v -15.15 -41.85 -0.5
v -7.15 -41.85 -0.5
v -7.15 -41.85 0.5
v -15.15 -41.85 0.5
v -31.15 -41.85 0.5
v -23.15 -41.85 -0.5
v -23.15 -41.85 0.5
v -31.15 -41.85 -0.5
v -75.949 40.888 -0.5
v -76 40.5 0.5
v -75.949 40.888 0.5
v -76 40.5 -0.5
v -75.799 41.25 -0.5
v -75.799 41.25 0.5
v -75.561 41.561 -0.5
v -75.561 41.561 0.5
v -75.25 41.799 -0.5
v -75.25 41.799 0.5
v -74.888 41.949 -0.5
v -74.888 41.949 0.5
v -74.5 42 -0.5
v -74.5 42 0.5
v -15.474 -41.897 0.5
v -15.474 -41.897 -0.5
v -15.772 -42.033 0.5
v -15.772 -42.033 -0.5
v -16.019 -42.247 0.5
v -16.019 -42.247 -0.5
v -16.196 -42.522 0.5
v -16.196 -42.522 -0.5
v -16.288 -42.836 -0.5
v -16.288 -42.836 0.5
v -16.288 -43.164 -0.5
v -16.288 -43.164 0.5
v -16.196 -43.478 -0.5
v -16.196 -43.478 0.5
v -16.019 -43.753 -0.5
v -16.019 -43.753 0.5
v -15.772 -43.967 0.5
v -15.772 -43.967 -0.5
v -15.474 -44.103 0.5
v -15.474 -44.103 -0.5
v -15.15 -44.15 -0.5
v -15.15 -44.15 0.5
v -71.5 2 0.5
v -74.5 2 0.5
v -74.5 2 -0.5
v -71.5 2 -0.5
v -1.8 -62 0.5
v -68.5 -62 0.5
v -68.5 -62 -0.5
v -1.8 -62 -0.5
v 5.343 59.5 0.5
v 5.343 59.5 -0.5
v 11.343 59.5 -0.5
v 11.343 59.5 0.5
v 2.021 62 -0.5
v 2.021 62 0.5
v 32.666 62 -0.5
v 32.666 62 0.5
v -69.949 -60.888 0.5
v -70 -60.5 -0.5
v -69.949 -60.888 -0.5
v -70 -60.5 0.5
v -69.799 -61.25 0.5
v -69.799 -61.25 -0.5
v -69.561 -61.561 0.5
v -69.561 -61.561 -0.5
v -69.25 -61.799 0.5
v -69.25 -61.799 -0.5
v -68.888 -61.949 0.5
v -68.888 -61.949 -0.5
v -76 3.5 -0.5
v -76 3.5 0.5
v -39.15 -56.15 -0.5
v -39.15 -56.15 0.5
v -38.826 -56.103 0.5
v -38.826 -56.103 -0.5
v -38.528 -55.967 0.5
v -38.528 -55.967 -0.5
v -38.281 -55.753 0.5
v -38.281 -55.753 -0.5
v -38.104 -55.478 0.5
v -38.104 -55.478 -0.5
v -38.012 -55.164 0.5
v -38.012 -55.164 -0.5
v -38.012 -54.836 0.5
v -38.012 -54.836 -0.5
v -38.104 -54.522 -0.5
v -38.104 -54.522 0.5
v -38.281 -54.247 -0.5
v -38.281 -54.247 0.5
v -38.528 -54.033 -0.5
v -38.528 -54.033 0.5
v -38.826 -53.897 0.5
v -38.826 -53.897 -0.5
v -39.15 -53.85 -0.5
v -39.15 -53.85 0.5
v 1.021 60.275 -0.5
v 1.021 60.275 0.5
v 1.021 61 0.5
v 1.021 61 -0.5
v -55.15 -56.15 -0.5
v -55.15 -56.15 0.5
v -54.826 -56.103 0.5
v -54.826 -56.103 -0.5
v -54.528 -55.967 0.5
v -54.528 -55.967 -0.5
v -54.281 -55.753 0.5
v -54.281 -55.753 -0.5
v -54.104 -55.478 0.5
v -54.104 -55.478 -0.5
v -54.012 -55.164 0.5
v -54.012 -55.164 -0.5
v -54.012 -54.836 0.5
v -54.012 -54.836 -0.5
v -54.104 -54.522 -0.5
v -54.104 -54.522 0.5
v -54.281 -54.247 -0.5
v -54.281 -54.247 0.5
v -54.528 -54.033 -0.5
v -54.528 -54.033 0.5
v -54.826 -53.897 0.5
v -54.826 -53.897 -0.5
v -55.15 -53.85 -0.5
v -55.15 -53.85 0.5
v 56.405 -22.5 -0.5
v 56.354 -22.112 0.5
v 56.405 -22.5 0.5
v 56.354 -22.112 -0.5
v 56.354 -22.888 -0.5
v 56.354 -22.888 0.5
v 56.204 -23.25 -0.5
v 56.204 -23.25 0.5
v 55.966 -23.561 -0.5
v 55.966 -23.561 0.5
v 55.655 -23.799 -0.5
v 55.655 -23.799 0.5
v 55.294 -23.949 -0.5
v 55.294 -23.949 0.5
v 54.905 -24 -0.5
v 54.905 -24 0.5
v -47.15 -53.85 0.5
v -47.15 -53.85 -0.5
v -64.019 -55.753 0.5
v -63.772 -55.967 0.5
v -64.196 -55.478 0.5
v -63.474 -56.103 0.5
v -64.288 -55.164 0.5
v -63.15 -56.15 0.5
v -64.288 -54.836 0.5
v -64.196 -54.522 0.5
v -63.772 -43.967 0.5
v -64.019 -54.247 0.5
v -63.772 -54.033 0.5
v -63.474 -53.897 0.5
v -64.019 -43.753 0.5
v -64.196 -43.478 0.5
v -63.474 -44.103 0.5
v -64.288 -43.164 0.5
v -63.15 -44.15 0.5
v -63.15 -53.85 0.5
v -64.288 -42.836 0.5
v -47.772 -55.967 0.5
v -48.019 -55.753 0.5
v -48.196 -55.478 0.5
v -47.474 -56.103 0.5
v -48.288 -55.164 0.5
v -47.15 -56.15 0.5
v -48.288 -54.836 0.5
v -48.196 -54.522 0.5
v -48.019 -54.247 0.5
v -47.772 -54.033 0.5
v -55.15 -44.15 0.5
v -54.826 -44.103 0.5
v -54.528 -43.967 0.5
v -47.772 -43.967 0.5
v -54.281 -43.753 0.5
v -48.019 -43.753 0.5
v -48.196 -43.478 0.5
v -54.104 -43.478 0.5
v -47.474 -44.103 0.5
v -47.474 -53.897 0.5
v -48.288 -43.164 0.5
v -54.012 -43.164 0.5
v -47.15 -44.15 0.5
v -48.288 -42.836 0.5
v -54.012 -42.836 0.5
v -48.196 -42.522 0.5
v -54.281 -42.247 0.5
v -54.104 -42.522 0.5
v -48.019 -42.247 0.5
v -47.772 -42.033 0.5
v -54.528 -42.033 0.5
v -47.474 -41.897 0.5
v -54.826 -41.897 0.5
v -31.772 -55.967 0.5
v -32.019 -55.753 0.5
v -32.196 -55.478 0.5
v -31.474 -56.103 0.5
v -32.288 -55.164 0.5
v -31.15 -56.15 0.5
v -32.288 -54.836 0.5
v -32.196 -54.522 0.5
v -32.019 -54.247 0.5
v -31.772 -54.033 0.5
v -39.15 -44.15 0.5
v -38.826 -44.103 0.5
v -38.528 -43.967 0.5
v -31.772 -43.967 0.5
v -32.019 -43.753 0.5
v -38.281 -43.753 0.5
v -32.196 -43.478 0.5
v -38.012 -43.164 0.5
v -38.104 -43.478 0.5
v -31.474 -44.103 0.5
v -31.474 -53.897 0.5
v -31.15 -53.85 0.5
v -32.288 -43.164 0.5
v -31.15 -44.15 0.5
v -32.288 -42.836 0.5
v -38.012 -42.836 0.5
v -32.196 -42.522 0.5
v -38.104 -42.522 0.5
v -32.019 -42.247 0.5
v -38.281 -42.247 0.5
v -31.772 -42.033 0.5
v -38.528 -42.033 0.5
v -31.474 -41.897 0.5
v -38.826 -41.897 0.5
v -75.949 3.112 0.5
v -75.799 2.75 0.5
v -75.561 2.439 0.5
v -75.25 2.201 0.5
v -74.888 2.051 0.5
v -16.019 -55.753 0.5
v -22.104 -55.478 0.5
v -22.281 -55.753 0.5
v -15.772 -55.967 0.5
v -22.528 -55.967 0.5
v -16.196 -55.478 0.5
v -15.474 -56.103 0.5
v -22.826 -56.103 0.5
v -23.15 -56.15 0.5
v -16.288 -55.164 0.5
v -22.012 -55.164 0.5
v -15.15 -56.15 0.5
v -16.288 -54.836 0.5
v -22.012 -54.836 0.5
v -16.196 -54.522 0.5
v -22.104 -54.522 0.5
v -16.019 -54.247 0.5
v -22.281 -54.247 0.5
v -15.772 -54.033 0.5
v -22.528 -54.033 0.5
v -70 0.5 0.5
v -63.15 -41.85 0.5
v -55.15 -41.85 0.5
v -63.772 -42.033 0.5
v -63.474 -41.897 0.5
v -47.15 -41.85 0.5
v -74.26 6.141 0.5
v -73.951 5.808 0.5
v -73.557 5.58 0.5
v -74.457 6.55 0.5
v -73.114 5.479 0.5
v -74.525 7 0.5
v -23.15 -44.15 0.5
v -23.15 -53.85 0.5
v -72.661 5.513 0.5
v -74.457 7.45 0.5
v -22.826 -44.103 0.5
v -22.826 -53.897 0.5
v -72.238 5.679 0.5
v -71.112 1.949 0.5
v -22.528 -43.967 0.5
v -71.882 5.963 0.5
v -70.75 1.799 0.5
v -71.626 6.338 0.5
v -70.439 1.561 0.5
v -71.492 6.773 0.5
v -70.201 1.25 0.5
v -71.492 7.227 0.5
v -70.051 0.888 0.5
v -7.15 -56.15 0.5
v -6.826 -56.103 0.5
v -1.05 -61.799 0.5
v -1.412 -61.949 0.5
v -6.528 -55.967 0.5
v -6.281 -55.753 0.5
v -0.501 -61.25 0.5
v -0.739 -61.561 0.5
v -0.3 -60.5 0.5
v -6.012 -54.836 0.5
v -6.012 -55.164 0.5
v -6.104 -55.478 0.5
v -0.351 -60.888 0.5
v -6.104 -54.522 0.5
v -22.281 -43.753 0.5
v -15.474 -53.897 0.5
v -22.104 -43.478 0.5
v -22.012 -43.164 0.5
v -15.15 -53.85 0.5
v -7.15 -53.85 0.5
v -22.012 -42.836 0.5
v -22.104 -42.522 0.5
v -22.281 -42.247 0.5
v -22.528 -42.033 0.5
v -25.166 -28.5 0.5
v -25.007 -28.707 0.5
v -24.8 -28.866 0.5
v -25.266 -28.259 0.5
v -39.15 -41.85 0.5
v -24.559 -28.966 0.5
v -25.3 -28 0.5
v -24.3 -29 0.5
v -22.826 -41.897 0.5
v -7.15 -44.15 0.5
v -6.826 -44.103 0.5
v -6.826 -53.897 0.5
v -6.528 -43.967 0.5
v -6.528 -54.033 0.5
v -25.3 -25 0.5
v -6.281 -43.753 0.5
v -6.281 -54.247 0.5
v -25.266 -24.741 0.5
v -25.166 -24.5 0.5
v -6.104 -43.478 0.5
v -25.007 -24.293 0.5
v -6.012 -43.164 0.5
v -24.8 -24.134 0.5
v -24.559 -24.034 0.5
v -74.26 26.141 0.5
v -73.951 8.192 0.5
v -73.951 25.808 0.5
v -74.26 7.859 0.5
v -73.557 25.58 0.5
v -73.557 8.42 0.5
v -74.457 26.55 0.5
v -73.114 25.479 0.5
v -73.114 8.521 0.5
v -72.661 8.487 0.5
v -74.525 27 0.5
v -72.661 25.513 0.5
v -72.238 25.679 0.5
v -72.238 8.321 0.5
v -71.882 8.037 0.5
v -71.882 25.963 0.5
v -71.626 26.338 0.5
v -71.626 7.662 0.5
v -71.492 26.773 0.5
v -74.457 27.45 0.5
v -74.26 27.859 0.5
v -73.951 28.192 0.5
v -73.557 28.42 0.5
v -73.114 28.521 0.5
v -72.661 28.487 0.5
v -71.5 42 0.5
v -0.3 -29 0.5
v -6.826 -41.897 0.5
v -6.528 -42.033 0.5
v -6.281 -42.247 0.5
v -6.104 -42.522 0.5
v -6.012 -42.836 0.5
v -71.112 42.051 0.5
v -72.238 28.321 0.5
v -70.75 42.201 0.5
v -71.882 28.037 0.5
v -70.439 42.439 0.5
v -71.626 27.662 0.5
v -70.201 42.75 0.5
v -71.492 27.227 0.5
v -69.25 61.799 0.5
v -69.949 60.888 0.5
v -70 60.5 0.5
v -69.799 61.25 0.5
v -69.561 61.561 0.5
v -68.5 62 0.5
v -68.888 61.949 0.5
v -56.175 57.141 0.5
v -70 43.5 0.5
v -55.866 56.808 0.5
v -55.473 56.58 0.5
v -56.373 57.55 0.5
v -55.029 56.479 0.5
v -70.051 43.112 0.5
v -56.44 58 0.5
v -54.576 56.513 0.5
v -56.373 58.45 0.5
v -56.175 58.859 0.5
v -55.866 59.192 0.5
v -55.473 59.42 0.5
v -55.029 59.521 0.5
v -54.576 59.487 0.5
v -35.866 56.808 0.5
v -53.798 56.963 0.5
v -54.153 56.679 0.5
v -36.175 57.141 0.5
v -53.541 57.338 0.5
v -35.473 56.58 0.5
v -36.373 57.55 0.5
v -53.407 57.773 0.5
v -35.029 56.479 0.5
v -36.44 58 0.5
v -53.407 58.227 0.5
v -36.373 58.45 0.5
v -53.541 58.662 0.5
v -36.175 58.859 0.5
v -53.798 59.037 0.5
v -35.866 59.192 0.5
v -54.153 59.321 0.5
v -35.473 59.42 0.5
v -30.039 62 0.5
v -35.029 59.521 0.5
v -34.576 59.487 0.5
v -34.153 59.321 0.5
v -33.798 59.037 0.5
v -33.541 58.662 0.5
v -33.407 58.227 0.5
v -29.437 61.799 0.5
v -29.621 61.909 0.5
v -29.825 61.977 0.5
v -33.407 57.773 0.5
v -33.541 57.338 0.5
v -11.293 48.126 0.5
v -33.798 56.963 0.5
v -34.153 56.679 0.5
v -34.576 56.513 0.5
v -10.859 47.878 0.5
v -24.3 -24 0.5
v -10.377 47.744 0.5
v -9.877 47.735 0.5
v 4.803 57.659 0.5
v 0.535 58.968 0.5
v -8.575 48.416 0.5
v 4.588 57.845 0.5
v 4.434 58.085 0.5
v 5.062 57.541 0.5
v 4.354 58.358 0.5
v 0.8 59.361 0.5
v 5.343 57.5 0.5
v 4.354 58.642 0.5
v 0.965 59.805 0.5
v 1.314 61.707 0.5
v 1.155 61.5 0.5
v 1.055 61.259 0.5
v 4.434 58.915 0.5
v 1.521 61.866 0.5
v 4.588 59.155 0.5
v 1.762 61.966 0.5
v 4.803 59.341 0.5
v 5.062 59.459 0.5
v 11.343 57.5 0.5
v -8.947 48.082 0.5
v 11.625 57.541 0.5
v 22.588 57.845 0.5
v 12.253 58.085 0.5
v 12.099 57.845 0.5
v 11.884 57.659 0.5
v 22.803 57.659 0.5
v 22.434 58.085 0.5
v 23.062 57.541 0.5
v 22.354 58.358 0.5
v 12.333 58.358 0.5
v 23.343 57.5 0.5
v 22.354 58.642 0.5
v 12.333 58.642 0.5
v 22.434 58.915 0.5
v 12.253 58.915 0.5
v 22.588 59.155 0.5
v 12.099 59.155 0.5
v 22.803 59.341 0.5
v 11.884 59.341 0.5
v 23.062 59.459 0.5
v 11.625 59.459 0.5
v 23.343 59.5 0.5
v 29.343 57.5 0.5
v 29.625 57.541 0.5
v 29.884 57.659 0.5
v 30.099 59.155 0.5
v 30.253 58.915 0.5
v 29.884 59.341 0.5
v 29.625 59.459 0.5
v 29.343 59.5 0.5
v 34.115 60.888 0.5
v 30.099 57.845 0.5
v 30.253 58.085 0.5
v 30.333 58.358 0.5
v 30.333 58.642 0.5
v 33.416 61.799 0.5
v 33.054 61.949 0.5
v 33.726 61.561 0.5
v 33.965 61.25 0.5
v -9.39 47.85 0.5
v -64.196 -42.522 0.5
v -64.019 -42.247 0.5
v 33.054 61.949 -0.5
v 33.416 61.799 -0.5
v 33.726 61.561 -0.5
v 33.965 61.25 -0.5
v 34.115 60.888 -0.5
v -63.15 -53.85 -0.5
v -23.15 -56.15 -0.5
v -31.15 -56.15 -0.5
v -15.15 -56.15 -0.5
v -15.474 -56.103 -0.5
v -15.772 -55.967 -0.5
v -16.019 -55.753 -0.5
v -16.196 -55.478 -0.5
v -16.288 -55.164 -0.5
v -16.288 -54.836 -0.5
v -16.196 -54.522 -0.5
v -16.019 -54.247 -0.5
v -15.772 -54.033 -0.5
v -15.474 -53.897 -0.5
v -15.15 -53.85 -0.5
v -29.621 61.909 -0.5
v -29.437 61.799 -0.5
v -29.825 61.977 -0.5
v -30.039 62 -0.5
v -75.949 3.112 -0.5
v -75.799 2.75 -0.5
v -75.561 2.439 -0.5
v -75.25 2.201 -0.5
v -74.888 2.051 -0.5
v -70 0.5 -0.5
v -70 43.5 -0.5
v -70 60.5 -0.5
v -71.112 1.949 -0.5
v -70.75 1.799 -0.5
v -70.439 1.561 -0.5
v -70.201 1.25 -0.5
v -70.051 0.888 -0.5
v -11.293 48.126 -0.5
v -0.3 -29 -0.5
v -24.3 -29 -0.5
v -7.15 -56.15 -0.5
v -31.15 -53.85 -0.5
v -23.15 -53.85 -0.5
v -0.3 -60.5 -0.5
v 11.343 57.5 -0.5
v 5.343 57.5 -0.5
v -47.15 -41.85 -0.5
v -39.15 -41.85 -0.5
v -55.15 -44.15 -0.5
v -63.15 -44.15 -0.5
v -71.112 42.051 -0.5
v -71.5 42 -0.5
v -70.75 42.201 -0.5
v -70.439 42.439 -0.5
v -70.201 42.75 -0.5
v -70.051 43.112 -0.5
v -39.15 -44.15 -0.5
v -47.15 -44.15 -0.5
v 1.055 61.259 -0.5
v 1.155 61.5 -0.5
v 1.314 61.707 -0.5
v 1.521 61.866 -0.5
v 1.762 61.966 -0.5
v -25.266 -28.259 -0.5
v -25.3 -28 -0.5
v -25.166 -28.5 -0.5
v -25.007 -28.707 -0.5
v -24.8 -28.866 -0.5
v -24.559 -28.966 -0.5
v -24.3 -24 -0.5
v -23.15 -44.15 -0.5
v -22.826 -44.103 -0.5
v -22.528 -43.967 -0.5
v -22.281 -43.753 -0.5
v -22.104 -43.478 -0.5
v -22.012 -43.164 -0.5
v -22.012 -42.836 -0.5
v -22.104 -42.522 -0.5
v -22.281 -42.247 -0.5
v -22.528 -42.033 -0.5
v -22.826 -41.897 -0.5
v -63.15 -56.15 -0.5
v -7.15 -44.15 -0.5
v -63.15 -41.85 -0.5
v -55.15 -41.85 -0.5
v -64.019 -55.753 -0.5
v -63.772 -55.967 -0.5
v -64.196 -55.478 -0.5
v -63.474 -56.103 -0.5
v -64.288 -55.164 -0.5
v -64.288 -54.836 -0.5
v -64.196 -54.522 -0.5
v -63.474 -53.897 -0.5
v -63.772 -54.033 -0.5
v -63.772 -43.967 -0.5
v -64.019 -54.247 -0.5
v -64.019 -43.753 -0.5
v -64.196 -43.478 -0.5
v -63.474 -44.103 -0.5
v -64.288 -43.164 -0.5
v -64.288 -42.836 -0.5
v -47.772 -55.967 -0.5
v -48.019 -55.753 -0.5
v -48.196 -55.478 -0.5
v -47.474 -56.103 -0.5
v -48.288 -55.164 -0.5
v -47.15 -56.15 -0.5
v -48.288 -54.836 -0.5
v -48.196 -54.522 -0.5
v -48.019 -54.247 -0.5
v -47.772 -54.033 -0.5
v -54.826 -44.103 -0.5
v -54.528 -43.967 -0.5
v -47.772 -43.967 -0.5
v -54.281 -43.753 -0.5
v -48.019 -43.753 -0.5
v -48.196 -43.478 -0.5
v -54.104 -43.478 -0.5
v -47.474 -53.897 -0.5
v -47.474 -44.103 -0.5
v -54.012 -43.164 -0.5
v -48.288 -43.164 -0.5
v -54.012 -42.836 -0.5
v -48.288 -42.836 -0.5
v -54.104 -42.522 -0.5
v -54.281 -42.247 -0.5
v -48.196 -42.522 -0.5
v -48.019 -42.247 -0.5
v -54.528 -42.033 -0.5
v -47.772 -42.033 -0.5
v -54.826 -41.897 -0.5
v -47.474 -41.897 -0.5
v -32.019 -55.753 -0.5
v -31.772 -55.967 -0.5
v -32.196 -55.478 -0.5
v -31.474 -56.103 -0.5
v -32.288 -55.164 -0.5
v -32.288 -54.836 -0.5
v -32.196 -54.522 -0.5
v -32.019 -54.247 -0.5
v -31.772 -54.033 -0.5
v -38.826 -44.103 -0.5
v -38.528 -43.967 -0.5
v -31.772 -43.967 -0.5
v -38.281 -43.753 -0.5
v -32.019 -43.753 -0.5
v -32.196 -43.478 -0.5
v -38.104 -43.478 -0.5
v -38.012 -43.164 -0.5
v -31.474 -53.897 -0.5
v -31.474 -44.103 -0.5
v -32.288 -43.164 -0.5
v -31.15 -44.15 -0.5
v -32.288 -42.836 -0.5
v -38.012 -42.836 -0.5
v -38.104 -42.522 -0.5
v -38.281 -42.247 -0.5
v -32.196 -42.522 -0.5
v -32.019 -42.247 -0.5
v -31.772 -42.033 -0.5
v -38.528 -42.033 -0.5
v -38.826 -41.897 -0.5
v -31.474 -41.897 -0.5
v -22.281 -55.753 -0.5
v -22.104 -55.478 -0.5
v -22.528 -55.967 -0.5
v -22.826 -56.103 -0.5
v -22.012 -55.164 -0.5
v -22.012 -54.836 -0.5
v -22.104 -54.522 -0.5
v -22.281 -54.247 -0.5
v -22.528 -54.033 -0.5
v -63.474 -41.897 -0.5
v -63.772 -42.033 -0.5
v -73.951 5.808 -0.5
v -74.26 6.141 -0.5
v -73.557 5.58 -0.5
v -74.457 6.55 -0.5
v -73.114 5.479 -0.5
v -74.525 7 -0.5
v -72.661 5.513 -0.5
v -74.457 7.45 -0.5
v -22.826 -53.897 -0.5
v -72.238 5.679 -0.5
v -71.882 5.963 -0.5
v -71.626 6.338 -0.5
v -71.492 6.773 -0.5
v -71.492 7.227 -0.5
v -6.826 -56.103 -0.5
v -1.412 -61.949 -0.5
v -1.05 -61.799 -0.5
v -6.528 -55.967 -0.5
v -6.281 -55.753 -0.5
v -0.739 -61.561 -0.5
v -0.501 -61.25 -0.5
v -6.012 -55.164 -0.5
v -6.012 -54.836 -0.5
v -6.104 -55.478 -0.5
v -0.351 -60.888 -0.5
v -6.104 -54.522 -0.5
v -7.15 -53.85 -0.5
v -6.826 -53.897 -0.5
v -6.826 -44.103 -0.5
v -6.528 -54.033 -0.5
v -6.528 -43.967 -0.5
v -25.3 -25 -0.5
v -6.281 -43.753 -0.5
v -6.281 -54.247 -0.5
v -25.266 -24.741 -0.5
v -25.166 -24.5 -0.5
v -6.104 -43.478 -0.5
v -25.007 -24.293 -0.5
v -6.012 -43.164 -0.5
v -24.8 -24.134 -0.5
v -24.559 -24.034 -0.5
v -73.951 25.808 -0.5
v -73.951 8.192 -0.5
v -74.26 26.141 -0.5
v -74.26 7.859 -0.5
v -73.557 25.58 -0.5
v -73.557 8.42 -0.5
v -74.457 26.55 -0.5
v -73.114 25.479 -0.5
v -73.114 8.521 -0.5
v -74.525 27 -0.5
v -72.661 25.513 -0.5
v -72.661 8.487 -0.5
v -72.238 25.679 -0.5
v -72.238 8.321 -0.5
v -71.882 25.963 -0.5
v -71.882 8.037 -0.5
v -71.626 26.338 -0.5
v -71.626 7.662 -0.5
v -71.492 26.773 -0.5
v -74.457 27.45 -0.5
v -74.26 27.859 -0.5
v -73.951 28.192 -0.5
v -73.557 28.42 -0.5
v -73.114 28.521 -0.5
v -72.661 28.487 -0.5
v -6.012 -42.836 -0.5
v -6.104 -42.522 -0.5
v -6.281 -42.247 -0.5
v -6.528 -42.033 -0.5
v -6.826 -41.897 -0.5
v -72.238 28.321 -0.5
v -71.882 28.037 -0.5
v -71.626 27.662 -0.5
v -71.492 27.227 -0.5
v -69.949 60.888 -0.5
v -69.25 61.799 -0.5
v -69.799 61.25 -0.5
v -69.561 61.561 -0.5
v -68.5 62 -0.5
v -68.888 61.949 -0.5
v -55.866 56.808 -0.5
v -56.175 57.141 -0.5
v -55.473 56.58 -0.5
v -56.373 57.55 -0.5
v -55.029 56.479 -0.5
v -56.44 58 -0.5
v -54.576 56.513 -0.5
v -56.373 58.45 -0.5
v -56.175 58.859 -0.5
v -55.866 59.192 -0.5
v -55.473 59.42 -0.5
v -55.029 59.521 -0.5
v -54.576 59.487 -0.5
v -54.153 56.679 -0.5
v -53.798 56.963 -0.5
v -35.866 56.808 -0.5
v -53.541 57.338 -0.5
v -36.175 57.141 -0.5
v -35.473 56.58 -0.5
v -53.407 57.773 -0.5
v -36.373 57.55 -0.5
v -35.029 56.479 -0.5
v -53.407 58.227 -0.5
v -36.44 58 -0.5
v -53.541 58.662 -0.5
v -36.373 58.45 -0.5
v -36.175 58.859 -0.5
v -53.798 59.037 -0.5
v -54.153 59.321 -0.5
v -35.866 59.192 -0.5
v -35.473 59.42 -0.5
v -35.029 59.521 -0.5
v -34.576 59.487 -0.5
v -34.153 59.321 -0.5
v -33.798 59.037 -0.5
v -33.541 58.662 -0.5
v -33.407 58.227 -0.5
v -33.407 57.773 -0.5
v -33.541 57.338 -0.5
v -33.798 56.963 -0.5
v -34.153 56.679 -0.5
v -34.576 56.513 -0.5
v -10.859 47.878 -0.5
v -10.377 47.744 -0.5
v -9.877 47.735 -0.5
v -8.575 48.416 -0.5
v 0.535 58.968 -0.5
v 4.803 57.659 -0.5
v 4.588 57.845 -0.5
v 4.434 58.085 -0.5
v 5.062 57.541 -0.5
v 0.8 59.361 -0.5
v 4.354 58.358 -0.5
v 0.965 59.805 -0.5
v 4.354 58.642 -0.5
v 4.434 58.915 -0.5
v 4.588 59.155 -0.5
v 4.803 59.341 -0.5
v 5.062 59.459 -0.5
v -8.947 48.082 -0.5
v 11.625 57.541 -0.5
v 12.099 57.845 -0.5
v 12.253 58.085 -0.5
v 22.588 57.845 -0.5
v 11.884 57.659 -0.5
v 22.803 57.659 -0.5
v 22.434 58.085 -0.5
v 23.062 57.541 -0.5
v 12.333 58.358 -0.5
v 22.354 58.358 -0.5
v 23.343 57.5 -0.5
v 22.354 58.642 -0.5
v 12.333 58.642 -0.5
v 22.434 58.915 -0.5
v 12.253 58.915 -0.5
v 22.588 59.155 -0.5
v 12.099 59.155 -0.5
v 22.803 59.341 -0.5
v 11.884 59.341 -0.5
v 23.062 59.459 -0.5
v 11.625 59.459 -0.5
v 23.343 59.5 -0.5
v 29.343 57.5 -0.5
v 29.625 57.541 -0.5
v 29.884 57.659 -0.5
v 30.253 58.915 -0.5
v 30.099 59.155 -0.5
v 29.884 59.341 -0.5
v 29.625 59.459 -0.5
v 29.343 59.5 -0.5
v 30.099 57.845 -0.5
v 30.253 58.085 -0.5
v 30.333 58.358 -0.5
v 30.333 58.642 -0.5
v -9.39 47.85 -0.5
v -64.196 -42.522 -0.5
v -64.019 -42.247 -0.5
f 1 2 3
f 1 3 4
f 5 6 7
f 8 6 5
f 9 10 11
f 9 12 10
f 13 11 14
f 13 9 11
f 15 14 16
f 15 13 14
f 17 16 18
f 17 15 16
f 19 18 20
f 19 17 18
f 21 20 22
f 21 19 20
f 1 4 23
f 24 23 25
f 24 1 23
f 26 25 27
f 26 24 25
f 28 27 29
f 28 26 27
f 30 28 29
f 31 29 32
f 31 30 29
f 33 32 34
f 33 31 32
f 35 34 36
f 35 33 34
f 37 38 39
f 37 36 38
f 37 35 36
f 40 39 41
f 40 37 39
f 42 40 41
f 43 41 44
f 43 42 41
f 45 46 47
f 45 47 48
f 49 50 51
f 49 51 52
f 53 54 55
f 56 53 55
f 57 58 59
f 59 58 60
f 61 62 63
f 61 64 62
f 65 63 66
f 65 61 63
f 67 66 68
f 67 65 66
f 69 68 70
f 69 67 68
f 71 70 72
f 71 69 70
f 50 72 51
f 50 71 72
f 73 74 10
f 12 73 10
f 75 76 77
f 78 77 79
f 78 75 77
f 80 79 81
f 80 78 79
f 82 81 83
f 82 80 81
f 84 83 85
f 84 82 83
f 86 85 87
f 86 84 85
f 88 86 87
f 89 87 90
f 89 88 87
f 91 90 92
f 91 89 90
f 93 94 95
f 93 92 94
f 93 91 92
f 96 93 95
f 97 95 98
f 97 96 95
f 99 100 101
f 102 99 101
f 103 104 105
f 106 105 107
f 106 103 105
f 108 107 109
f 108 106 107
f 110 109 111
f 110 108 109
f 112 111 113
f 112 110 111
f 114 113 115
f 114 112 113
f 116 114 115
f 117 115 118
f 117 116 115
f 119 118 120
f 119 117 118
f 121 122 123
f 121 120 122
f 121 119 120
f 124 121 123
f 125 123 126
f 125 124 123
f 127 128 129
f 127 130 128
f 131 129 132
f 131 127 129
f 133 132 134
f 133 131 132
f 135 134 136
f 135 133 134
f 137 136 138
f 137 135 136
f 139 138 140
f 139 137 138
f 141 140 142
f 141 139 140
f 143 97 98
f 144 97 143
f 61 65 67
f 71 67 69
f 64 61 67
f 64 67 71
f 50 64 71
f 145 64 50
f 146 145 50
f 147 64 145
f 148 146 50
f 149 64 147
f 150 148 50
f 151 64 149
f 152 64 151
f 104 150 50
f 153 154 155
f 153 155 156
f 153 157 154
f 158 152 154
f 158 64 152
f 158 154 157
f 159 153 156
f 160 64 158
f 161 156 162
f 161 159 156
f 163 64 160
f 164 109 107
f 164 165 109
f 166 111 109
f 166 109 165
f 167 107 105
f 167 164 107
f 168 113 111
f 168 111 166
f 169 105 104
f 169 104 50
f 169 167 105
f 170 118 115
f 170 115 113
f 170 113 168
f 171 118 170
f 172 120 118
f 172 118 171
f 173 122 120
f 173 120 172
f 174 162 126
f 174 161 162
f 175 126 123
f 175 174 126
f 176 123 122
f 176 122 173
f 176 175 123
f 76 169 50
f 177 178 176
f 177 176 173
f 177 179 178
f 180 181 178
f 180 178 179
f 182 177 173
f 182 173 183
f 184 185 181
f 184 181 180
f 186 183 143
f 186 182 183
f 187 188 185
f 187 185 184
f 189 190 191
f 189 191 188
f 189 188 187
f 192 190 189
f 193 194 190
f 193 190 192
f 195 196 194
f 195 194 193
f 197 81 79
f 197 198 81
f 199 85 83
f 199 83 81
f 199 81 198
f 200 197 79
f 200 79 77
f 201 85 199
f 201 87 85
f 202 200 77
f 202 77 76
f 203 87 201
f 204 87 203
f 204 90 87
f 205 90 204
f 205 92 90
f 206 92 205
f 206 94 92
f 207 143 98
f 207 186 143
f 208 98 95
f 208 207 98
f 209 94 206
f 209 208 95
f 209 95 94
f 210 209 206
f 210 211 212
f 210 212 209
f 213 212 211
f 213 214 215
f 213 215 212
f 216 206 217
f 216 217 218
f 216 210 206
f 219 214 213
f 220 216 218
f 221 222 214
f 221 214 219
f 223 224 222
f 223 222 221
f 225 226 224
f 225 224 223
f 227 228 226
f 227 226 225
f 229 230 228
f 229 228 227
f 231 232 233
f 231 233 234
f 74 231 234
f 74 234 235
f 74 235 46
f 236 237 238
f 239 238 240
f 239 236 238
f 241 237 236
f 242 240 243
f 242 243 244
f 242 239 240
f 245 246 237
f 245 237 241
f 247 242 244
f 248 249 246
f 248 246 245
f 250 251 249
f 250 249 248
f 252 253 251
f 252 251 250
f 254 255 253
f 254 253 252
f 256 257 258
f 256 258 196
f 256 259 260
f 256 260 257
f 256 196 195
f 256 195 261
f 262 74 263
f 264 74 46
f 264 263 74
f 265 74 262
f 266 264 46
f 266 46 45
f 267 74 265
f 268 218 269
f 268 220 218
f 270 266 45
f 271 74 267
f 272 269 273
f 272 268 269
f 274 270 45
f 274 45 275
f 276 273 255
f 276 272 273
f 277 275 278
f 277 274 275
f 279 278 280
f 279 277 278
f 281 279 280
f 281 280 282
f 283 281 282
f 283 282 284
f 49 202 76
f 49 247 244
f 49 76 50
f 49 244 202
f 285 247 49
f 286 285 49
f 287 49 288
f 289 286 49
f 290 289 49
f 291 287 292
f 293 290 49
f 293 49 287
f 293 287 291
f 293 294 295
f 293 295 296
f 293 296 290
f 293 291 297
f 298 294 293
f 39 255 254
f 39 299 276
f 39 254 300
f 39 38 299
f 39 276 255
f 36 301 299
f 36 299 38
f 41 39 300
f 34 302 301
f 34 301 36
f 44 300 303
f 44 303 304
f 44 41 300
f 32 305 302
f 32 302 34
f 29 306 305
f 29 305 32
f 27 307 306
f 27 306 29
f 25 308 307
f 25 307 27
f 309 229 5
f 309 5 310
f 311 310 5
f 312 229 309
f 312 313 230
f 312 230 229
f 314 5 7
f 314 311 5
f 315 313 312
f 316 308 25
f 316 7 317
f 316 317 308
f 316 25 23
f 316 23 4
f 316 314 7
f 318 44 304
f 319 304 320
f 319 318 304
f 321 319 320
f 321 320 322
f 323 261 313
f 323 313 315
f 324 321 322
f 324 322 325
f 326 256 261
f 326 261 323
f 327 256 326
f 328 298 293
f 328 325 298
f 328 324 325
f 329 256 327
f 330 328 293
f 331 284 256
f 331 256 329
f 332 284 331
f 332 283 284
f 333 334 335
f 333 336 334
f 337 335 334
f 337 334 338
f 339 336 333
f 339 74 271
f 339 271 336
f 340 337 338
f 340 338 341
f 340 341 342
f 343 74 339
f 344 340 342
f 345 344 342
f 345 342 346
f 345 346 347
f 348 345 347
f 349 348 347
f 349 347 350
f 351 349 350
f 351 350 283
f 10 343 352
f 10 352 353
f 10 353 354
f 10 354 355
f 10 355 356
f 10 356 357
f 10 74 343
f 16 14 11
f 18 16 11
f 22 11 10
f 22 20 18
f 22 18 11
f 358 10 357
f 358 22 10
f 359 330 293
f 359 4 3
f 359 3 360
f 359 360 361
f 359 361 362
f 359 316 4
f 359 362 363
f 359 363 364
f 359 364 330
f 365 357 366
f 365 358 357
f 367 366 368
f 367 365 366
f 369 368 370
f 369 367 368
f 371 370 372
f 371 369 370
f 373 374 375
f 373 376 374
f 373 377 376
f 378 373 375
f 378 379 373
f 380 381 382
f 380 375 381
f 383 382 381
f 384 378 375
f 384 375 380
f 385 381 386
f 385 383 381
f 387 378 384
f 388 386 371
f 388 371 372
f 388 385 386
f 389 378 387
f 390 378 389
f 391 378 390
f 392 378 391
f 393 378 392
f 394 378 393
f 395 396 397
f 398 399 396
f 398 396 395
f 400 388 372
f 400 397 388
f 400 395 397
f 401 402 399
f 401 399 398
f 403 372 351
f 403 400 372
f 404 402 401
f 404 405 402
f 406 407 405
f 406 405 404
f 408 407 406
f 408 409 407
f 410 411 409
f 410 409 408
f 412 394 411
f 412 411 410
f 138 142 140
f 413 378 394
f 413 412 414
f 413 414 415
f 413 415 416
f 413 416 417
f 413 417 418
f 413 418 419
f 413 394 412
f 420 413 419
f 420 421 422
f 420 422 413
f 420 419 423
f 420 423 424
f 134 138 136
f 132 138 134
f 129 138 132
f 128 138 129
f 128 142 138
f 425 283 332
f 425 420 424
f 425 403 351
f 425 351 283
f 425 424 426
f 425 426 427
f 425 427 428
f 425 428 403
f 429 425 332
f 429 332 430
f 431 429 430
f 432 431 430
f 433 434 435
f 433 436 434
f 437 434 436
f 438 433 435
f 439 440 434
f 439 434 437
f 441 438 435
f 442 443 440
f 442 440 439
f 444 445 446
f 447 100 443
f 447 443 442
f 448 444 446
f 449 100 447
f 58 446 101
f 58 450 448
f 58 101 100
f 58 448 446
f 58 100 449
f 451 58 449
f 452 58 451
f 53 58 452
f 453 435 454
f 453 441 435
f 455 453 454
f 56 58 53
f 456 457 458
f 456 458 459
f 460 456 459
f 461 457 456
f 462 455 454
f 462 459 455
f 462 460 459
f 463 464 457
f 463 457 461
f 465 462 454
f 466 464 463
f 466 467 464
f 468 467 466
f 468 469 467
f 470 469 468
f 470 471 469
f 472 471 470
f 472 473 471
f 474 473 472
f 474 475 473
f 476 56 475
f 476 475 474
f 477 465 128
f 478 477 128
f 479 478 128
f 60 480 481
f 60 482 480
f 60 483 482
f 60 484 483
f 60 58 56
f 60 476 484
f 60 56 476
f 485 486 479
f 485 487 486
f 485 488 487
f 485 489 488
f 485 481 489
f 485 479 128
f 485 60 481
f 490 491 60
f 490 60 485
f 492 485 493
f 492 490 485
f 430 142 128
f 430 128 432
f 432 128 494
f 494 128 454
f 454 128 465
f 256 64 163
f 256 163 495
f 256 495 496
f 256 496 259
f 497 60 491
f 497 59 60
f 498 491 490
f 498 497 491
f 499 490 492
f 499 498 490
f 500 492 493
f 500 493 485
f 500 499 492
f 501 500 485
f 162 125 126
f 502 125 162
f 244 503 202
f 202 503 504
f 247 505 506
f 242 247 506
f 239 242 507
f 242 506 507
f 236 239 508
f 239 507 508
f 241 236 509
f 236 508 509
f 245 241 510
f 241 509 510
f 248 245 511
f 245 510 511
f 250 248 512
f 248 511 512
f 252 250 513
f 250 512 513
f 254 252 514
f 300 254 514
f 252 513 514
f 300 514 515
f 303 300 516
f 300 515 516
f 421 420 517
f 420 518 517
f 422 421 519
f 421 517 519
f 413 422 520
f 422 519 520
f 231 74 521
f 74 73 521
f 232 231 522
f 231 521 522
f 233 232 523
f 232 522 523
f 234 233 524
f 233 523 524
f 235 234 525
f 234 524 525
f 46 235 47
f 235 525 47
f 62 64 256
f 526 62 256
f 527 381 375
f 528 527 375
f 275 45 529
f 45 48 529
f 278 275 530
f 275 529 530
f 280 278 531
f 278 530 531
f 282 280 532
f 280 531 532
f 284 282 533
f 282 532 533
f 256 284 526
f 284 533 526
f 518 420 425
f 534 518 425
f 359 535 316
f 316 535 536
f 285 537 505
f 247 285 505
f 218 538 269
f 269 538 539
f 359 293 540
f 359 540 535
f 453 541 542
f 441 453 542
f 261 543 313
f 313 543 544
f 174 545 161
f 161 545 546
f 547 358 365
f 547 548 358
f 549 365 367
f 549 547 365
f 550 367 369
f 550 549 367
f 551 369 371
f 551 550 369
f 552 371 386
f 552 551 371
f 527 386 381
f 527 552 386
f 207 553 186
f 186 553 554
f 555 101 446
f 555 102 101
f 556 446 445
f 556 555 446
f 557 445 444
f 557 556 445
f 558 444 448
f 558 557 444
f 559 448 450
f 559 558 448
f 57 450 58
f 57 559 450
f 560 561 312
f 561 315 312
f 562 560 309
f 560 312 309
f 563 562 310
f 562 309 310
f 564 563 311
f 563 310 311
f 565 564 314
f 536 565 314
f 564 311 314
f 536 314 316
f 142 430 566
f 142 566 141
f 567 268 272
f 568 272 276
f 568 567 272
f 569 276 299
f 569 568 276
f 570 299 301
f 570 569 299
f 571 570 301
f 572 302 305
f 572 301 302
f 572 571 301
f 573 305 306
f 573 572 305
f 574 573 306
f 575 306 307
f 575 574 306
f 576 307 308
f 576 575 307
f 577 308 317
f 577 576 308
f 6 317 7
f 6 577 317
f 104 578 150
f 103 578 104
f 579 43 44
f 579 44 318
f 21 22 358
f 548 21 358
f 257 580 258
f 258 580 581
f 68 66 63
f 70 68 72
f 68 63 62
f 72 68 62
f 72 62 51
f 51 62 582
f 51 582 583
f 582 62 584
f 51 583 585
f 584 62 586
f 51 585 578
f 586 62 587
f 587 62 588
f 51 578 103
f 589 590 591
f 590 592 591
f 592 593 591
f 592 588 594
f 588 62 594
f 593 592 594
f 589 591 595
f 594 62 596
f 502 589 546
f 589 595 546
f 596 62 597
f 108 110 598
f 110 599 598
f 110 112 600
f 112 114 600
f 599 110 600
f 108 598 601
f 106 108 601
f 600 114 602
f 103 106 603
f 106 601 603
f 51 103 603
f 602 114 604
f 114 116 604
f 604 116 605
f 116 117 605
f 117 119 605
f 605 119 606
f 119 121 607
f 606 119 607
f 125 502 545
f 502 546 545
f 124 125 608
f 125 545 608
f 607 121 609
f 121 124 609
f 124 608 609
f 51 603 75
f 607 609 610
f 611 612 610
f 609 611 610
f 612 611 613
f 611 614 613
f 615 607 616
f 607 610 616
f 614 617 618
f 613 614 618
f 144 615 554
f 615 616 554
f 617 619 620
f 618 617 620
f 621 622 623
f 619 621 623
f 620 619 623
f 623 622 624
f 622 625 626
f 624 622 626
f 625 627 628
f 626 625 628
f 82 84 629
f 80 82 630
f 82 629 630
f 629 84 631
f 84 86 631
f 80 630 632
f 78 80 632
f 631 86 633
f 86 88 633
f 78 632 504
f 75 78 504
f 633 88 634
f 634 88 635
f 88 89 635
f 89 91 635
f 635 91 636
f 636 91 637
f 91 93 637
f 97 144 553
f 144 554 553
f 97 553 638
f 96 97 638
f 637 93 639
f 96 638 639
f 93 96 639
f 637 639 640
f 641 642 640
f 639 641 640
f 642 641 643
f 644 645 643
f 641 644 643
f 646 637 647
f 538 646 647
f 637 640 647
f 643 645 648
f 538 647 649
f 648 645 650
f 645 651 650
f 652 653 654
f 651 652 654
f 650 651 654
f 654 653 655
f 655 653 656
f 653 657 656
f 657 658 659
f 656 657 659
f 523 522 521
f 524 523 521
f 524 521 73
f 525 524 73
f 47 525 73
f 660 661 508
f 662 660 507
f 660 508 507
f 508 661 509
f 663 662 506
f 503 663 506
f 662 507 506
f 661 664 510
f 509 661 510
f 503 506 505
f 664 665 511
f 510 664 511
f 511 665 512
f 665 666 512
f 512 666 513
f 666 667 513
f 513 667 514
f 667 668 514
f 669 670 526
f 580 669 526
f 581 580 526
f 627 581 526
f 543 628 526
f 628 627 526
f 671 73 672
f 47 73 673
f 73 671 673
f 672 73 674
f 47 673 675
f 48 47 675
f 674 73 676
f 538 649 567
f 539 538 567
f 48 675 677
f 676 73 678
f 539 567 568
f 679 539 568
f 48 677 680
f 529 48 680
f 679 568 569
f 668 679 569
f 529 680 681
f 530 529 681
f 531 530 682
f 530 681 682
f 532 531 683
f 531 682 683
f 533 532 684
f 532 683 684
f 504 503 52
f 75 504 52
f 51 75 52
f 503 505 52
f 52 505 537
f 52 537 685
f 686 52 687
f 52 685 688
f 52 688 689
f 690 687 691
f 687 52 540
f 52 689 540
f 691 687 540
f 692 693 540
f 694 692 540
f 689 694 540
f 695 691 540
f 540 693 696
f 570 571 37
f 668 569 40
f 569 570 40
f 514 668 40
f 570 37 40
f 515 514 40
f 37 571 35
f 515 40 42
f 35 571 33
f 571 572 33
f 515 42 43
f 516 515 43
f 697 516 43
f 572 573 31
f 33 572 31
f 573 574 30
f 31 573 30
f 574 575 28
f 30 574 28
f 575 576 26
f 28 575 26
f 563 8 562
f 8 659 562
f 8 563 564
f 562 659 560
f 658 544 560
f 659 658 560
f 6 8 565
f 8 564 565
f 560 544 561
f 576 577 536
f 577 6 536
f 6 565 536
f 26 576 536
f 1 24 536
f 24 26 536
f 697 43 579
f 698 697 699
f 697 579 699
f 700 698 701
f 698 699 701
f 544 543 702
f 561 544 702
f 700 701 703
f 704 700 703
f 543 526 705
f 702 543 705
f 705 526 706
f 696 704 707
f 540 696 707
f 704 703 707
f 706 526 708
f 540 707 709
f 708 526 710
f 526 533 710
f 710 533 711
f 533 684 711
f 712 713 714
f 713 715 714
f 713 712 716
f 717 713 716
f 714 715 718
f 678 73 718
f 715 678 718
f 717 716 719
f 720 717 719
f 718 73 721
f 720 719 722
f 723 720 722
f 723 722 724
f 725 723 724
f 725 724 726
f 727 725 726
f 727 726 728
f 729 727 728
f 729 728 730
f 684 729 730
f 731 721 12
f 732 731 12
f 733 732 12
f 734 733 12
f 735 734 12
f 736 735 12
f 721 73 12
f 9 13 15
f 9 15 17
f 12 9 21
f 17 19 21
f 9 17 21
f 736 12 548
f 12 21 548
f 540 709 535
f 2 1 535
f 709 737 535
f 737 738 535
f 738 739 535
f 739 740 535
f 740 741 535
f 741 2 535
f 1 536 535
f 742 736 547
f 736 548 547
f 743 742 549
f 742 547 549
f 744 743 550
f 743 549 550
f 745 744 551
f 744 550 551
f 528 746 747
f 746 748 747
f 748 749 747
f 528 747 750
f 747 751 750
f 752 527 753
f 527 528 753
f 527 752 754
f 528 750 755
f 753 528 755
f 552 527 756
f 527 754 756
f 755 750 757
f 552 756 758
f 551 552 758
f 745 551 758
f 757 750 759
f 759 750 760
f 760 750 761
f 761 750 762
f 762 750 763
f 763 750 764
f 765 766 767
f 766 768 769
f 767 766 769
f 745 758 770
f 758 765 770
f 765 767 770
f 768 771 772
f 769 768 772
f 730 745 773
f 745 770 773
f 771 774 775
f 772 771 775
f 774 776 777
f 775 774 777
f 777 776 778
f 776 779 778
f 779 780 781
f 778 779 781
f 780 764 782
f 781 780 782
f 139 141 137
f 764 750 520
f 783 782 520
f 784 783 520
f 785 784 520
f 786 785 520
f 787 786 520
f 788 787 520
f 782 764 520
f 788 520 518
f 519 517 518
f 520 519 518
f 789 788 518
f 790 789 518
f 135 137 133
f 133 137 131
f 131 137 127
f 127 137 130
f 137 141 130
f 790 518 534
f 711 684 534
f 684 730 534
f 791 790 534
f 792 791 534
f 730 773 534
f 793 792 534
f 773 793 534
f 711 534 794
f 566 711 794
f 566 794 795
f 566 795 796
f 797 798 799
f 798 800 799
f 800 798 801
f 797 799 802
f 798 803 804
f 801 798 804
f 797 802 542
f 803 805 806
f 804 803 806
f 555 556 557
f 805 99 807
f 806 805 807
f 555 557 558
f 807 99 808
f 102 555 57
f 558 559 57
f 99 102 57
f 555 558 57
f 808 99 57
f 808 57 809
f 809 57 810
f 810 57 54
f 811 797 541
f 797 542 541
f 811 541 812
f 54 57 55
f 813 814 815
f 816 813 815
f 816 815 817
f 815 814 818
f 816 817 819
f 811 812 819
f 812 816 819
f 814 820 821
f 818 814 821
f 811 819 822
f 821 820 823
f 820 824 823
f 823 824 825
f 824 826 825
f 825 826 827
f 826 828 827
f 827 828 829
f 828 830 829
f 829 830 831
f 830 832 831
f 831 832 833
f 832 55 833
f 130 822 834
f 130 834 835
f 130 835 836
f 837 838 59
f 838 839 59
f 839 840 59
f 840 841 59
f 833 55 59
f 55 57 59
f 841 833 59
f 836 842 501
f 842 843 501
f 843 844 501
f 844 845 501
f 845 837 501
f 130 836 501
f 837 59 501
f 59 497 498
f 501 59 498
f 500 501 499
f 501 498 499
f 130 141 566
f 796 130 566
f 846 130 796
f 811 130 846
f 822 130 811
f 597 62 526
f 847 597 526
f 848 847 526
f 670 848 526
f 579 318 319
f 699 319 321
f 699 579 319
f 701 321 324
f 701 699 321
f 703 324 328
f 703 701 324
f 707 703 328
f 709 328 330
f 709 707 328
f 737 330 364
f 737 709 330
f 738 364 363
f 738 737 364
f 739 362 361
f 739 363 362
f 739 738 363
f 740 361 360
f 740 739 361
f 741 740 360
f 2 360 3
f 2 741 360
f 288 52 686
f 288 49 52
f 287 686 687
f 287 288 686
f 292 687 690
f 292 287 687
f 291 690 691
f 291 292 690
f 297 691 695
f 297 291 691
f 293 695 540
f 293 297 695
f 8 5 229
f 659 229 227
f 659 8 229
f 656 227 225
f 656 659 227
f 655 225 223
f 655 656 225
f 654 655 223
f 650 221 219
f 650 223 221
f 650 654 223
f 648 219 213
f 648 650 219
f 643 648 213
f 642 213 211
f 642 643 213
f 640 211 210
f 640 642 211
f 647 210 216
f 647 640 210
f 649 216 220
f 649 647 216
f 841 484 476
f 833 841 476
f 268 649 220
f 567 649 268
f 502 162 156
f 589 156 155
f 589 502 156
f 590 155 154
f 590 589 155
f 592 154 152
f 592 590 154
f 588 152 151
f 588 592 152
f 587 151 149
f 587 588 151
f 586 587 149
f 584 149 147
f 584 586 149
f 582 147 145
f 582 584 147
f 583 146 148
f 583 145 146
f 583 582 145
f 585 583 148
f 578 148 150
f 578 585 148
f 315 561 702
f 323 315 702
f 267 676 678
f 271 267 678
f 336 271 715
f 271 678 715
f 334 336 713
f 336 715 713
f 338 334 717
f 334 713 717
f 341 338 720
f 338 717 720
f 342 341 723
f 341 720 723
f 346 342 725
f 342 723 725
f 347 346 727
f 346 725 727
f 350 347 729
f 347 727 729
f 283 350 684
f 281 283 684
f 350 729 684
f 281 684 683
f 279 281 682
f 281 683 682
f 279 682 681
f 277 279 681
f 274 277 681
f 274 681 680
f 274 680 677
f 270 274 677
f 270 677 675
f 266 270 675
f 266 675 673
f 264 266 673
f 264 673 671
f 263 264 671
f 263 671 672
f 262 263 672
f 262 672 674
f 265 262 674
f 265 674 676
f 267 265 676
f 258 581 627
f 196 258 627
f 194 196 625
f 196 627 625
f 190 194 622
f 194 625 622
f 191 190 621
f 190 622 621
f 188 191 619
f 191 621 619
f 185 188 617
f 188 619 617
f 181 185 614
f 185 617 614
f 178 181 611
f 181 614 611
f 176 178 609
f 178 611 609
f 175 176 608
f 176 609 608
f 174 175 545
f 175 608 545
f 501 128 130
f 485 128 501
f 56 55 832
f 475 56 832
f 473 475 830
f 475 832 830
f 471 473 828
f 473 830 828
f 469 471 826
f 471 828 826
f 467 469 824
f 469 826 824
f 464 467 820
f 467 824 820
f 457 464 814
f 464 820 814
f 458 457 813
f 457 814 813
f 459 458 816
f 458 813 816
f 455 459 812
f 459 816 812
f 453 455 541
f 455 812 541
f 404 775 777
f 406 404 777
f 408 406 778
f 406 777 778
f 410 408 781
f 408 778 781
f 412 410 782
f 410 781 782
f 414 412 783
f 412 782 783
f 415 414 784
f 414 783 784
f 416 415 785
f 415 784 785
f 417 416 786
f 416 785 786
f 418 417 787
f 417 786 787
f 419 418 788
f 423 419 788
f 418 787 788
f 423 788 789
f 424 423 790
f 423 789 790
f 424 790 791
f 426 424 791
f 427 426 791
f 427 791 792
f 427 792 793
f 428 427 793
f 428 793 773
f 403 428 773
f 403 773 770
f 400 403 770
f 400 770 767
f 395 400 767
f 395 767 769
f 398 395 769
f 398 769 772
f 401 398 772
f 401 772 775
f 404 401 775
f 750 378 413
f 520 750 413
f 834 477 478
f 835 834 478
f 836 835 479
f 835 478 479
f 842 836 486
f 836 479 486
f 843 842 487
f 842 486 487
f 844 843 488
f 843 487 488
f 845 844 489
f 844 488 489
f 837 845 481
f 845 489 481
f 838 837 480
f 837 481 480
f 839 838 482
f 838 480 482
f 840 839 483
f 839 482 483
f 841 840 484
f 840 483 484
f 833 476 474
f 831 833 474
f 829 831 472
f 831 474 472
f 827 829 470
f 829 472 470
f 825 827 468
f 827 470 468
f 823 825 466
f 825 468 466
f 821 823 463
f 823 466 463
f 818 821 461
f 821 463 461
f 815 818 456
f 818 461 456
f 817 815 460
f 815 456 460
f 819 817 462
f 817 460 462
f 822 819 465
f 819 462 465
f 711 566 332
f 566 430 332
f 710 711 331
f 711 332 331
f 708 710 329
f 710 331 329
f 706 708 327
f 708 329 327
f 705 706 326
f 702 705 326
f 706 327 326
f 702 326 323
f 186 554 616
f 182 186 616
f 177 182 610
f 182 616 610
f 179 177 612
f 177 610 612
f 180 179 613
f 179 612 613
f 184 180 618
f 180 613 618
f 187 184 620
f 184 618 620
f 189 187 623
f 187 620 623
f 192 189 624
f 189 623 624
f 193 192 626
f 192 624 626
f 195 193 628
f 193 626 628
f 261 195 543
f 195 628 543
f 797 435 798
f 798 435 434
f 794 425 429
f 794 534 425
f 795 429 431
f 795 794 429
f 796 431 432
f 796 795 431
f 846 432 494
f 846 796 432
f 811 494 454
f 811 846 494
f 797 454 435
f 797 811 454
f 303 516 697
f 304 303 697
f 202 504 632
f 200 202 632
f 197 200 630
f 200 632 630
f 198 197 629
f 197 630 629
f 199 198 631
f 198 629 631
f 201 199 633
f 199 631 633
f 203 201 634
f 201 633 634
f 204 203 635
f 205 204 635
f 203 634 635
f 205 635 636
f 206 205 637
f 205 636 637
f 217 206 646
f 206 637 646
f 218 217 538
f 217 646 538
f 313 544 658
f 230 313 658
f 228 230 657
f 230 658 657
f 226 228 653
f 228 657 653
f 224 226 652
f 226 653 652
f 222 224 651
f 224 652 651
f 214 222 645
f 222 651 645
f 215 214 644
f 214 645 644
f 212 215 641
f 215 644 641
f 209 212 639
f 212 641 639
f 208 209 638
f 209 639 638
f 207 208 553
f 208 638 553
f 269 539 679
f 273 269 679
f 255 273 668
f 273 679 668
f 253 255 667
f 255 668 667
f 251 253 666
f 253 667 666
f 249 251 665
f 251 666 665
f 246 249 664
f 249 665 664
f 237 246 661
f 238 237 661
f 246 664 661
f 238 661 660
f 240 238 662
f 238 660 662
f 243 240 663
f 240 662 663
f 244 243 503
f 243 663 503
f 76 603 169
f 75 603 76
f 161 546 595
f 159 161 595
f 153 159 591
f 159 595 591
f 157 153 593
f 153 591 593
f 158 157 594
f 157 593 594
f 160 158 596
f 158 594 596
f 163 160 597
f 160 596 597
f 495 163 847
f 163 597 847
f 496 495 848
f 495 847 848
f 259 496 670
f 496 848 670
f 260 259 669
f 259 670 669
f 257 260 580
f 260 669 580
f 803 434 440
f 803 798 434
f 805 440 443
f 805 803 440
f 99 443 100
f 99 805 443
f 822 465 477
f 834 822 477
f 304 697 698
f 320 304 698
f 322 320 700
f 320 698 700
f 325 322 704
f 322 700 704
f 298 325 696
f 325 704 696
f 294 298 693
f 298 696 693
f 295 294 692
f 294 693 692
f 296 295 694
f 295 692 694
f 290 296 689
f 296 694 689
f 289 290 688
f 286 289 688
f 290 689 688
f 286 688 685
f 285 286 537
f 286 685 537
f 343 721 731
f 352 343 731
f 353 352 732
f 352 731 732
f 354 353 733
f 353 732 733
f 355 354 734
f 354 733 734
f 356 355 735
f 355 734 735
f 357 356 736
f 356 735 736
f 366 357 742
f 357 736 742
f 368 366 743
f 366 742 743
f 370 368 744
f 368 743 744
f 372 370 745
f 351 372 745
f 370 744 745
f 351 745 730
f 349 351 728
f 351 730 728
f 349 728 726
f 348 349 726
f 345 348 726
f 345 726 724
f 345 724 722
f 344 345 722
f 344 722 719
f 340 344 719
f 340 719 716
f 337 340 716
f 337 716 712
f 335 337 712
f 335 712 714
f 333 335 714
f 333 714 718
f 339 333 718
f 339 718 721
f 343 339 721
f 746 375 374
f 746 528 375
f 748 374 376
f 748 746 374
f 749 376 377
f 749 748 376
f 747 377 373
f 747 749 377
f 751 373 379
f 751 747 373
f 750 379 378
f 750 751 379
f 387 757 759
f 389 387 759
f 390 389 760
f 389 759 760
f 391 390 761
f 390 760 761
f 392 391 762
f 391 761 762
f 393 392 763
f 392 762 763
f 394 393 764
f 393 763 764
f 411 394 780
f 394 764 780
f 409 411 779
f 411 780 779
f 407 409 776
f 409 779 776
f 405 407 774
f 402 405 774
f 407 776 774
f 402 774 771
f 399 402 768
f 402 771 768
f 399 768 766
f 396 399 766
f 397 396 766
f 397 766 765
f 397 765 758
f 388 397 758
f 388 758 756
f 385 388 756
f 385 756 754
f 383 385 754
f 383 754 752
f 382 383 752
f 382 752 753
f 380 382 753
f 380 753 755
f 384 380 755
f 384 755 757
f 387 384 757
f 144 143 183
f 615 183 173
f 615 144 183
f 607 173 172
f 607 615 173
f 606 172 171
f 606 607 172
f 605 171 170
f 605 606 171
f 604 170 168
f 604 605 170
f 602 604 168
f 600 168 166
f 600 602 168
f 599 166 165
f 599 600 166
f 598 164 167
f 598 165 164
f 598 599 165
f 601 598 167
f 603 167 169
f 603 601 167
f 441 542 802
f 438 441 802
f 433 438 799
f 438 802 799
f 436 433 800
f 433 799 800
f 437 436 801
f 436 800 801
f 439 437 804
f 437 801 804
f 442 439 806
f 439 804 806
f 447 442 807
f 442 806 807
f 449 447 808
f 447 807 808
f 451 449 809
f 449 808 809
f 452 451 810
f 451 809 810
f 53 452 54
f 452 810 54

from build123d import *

# Parameters (mm, degrees)
SKETCH_1_W          = 140
SKETCH_1_H          = 124
EXTRUDE_1_DEPTH     = 0.5
CUT_EXTRUDE_1_DEPTH = 1.5
SKETCH_3_W          = 12
SKETCH_3_H          = 40
EXTRUDE_2_DEPTH     = 1
SKETCH_5_R          = 1.525
CUT_EXTRUDE_3_DEPTH = 10
FILLET_1_R          = 1.5
SKETCH_8_W          = 26.5
SKETCH_8_H          = 5
CUT_EXTRUDE_5_DEPTH = 10
CUT_EXTRUDE_6_DEPTH = 10
CUT_EXTRUDE_7_DEPTH = 10
FILLET_2_R          = 2
FILLET_3_R          = 1
FILLET_4_R          = 1
CUT_EXTRUDE_8_DEPTH = 5


with BuildPart() as part:
    # 草图1 → 凸台-拉伸1 (new, symmetric)
    with BuildSketch(Plane.XY):
        Rectangle(SKETCH_1_W, SKETCH_1_H)
    extrude(amount=EXTRUDE_1_DEPTH, both=True)

    # 草图2 → 切除-拉伸1 (cut, symmetric)
    with BuildSketch(Plane.XY.offset(0.5)):
        Polygon((-0.3, -62), (-0.3, -24), (56.860254038, -24), (33.816623489, 62), (70, 62), (70, -62), align=None)
    extrude(amount=CUT_EXTRUDE_1_DEPTH, both=True, mode=Mode.SUBTRACT)

    # 草图3 → 凸台-拉伸2 (add)
    with BuildSketch(Plane.XY.offset(0.5)):
        with Locations((-70, 22)):
            Rectangle(SKETCH_3_W, SKETCH_3_H)
    extrude(amount=-EXTRUDE_2_DEPTH)

    # 草图5 → 切除-拉伸3 (cut)
    with BuildSketch(Plane(origin=(0, 0, -0.5), x_dir=(-1, 0, 0), z_dir=(0, 0, -1))):
        with Locations((34.915427319, 58)):
            Circle(SKETCH_5_R)
        with Locations((54.915427319, 58)):
            Circle(SKETCH_5_R)
        with Locations((73, 27)):
            Circle(SKETCH_5_R)
        with Locations((73, 7)):
            Circle(SKETCH_5_R)
    extrude(amount=-CUT_EXTRUDE_3_DEPTH, mode=Mode.SUBTRACT)

    # 圆角1
    fillet_1_edges = [part.edges().sort_by_distance(p)[0] for p in [
        (-0.3, -62, 0),
        (-0.3, -24, 0),
        (56.860254038, -24, 0),
        (33.816623489, 62, 0),
        (-76, 42, 0),
        (-70, 42, 0),
        (-76, 2, 0),
        (-70, 2, 0),
        (-70, -62, 0),
        (-70, 62, 0),
    ]]
    fillet(fillet_1_edges, radius=FILLET_1_R)

    # 草图8 → 切除-拉伸5 (cut)
    with BuildSketch(Plane(origin=(0, 0, -0.5), x_dir=(-1, 0, 0), z_dir=(0, 0, -1))):
        with Locations((12.05, -26.5)):
            Rectangle(SKETCH_8_W, SKETCH_8_H)
    extrude(amount=-CUT_EXTRUDE_5_DEPTH, mode=Mode.SUBTRACT)

    # 草图9 → 切除-拉伸6 (cut)
    with BuildSketch(Plane(origin=(0, 0, -0.5), x_dir=(-1, 0, 0), z_dir=(0, 0, -1))):
        with BuildLine():
            Line((23.15, -41.85), (31.15, -41.85))
            ThreePointArc((31.15, -41.85), (32.3, -43), (31.15, -44.15))
            Line((31.15, -44.15), (23.15, -44.15))
            ThreePointArc((23.15, -44.15), (22, -43), (23.15, -41.85))
        make_face()
        with BuildLine():
            Line((7.15, -41.85), (15.15, -41.85))
            ThreePointArc((15.15, -41.85), (16.3, -43), (15.15, -44.15))
            Line((15.15, -44.15), (7.15, -44.15))
            ThreePointArc((7.15, -44.15), (6, -43), (7.15, -41.85))
        make_face()
        with BuildLine():
            Line((47.15, -41.85), (39.15, -41.85))
            ThreePointArc((39.15, -41.85), (38, -43), (39.15, -44.15))
            Line((39.15, -44.15), (47.15, -44.15))
            ThreePointArc((47.15, -44.15), (48.3, -43), (47.15, -41.85))
        make_face()
        with BuildLine():
            Line((63.15, -41.85), (55.15, -41.85))
            ThreePointArc((55.15, -41.85), (54, -43), (55.15, -44.15))
            Line((55.15, -44.15), (63.15, -44.15))
            ThreePointArc((63.15, -44.15), (64.3, -43), (63.15, -41.85))
        make_face()
        with BuildLine():
            Line((23.15, -56.15), (31.15, -56.15))
            ThreePointArc((31.15, -56.15), (32.3, -55), (31.15, -53.85))
            Line((31.15, -53.85), (23.15, -53.85))
            ThreePointArc((23.15, -53.85), (22, -55), (23.15, -56.15))
        make_face()
        with BuildLine():
            Line((7.15, -56.15), (15.15, -56.15))
            ThreePointArc((15.15, -56.15), (16.3, -55), (15.15, -53.85))
            Line((15.15, -53.85), (7.15, -53.85))
            ThreePointArc((7.15, -53.85), (6, -55), (7.15, -56.15))
        make_face()
        with BuildLine():
            Line((47.15, -56.15), (39.15, -56.15))
            ThreePointArc((39.15, -56.15), (38, -55), (39.15, -53.85))
            Line((39.15, -53.85), (47.15, -53.85))
            ThreePointArc((47.15, -53.85), (48.3, -55), (47.15, -56.15))
        make_face()
        with BuildLine():
            Line((63.15, -56.15), (55.15, -56.15))
            ThreePointArc((55.15, -56.15), (54, -55), (55.15, -53.85))
            Line((55.15, -53.85), (63.15, -53.85))
            ThreePointArc((63.15, -53.85), (64.3, -55), (63.15, -56.15))
        make_face()
    extrude(amount=-CUT_EXTRUDE_6_DEPTH, mode=Mode.SUBTRACT)

    # 草图10 → 切除-拉伸7 (cut)
    with BuildSketch(Plane.XY.offset(0.5)):
        Polygon((1.02106128, 59.531168527), (1.02106128, 62), (-29.703905389, 62), (-9.798233064, 47), align=None)
    extrude(amount=-CUT_EXTRUDE_7_DEPTH, mode=Mode.SUBTRACT)

    # 圆角2
    fillet_2_edges = [part.edges().sort_by_distance(p)[0] for p in [
        (1.02106128, 59.531168527, 0),
        (-9.798233064, 47, 0),
    ]]
    fillet(fillet_2_edges, radius=FILLET_2_R)

    # 圆角3
    fillet_3_edges = [part.edges().sort_by_distance(p)[0] for p in [
        (-29.703905389, 62, 0),
        (1.02106128, 62, 0),
    ]]
    fillet(fillet_3_edges, radius=FILLET_3_R)

    # 圆角4
    fillet_4_edges = [part.edges().sort_by_distance(p)[0] for p in [
        (-25.3, -24, 0),
        (-25.3, -29, 0),
    ]]
    fillet(fillet_4_edges, radius=FILLET_4_R)

    # 草图11 → 切除-拉伸8 (cut, symmetric)
    with BuildSketch(Plane(origin=(0, 0, -0.5), x_dir=(-1, 0, 0), z_dir=(0, 0, -1))):
        with BuildLine():
            Line((-29.343347144, 59.5), (-23.343347144, 59.5))
            ThreePointArc((-23.343347144, 59.5), (-22.343347144, 58.5), (-23.343347144, 57.5))
            Line((-23.343347144, 57.5), (-29.343347144, 57.5))
            ThreePointArc((-29.343347144, 57.5), (-30.343347144, 58.5), (-29.343347144, 59.5))
        make_face()
        with BuildLine():
            Line((-5.343347144, 59.5), (-11.343347144, 59.5))
            ThreePointArc((-11.343347144, 59.5), (-12.343347144, 58.5), (-11.343347144, 57.5))
            Line((-11.343347144, 57.5), (-5.343347144, 57.5))
            ThreePointArc((-5.343347144, 57.5), (-4.343347144, 58.5), (-5.343347144, 59.5))
        make_face()
    extrude(amount=CUT_EXTRUDE_8_DEPTH, both=True, mode=Mode.SUBTRACT)


solid = part.part
